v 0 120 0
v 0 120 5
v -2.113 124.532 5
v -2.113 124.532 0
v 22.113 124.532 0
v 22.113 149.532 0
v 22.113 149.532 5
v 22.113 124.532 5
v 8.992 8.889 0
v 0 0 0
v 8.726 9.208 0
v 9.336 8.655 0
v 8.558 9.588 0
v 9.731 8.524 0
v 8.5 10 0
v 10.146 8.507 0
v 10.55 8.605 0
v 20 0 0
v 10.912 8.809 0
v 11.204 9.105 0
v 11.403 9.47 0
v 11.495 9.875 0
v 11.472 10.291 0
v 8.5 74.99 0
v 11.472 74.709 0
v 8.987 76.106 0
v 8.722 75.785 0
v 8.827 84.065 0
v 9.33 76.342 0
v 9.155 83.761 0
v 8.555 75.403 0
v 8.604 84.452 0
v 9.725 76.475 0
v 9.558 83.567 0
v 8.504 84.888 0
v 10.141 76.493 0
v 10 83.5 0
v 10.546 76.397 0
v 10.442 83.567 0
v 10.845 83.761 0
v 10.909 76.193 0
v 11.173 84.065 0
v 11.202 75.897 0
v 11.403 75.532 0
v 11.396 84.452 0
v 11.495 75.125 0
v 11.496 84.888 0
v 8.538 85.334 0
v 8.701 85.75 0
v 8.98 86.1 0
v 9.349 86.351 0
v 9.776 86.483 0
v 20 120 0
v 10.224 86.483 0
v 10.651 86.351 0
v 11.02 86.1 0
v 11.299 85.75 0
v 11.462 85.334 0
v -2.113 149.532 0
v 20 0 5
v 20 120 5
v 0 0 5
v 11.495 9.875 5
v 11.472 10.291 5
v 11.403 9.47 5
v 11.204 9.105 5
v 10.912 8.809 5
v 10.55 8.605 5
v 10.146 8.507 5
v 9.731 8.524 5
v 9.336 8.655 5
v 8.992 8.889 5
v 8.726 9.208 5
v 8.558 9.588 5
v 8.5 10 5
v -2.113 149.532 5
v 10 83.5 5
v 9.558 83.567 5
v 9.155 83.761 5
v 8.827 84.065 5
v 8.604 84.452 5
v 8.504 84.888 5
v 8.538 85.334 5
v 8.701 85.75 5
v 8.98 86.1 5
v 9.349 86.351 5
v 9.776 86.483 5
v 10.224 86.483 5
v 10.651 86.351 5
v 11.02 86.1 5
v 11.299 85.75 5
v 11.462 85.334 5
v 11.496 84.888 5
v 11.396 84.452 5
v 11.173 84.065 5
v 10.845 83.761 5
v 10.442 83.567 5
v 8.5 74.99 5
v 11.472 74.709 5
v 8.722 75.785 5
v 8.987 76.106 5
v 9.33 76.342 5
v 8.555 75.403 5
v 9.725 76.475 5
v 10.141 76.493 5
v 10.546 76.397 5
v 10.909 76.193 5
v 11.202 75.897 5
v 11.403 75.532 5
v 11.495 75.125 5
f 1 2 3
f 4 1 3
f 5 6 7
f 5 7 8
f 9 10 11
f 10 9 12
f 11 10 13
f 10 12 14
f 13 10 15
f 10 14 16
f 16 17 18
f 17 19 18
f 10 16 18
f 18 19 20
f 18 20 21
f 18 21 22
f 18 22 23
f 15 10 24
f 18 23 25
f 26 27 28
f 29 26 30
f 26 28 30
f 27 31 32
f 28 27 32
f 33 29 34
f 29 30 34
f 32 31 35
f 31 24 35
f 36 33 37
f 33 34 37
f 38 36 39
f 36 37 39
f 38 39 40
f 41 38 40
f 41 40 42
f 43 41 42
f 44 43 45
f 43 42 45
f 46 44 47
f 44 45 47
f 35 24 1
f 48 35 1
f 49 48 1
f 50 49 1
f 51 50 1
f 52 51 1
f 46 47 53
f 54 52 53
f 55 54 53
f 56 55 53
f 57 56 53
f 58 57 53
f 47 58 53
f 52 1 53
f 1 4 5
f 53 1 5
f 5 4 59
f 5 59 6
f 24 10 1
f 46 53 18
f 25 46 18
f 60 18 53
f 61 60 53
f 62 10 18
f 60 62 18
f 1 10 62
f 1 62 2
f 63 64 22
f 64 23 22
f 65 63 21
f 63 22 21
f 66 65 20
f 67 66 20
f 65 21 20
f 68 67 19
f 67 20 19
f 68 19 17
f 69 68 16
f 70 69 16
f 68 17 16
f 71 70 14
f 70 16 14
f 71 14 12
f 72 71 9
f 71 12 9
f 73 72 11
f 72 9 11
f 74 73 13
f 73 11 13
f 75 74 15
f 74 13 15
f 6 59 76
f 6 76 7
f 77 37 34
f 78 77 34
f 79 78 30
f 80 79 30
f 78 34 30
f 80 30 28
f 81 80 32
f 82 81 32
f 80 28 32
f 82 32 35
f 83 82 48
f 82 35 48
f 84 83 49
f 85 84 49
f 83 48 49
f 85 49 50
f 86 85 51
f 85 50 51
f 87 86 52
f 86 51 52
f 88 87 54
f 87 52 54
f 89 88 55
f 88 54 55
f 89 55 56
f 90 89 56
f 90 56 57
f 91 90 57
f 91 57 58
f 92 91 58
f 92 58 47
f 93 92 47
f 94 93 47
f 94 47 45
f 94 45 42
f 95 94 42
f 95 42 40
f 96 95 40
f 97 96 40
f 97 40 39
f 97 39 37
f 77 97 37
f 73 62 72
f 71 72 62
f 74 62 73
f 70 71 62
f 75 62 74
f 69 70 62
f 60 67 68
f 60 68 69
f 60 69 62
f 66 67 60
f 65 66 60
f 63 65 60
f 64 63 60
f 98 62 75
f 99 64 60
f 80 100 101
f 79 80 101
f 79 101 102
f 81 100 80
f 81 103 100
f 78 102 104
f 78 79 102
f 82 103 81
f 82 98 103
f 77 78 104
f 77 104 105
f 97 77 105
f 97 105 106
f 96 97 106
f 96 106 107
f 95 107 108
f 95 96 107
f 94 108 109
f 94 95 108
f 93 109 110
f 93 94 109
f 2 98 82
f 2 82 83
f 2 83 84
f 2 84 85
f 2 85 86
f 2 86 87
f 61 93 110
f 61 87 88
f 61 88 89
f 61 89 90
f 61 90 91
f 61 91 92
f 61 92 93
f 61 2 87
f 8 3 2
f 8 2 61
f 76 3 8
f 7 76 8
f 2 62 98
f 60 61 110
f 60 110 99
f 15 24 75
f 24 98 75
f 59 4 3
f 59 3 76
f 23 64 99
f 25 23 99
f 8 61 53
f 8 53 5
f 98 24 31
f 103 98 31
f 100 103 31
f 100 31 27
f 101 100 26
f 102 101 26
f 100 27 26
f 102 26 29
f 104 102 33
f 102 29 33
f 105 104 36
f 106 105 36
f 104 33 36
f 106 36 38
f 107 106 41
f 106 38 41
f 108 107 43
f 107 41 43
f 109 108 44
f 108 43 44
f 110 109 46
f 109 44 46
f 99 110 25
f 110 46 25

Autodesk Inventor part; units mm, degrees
ref_plane "YZ Plane" through (0, 0, 0) normal (1, 0, 0) x (0, 1, 0)
ref_plane "XZ Plane" through (0, 0, 0) normal (0, 1, 0) x (-1, 0, 0)
ref_plane "XY Plane" through (0, 0, 0) normal (0, 0, 1) x (1, 0, 0)
sketch "Sketch1" plane through (0, 0, 0) normal (0, 0, 1) x (1, 0, 0)
  line L0 (0, 0) -> (20, 0)
  line L1 (20, 0) -> (20, 120)
  line L2 (0, 0) -> (0, 120)
  line L3 (0, 0) -> (120, 0) construction
  line L4 (20, 120) -> (22.1131, 124.5315)
  line L5 (20, 120) -> (25, 120) construction
  line L6 (0, 120) -> (-2.1131, 124.5315)
  line L7 (-2.1131, 124.5315) -> (-2.1131, 149.5315)
  line L8 (-2.1131, 149.5315) -> (22.1131, 149.5315)
  line L9 (22.1131, 149.5315) -> (22.1131, 124.5315)
  dimension "d0" = 20
  dimension "d1" = 120
  dimension "d2" = 90
  dimension "d3" = 120
  dimension "d4" = 90
  dimension "d5" = 5
  dimension "d6" = 65
  dimension "d7" = 5
  dimension "d8" = 25
extrude "Extrusion1" add sketch "Sketch1" along normal blind 5
sketch "Sketch2" plane through (0, 0, 5) normal (0, 0, 1) x (1, 0, 0)
  point P0 (0, 0)
  point P1 (10, 10)
hole "Hole1" at (10, 10, 5) direction (0, 0, -1) diameter 3 end through all
sketch "Sketch3" plane through (0, 0, 5) normal (0, 0, 1) x (1, 0, 0)
  point P0 (0, 0)
sketch "Sketch4" plane through (0, 0, 5) normal (0, 0, 1) x (1, 0, 0)
  point P0 (0, 0)
  point P1 (10, 75)
hole "Hole2" at (10, 75, 5) direction (0, 0, -1) diameter 3 end through all
sketch "Sketch5" plane through (0, 0, 5) normal (0, 0, 1) x (1, 0, 0)
  circle A0 centre (10, 10) radius 1.5 projected
  line L0 (11.4716, 74.9905) -> (8.5, 74.9905)
  line L1 (8.5, 74.9905) -> (8.5, 10)
  line L2 (8.5, 10) -> (11.4716, 10)
  line L3 (11.4716, 10) -> (11.4716, 74.9905)
  point P0 (0, 0)
extrude "Extrusion2" cut sketch "Sketch5" against normal blind 10 contours L1 L0 L3 A0 | A0 L3 L2 picked at (9.5055, 10.1215)
sketch "Sketch6" plane through (0, 0, 5) normal (0, 0, 1) x (1, 0, 0)
  point P0 (0, 0)
  point P1 (10, 85)
hole "Hole3" at (10, 85, 5) direction (0, 0, -1) diameter 3 end through all
sketch "Sketch8" plane through (0, 0, 0) normal (0, 0, -1) x (-1, 0, 0)
  point P0 (0, 0)
  point P1 (-10, -8)
hole "Hole4" at (10, -8, 0) direction (0, 0, 1) diameter 3 end through all
sketch "Sketch10" plane through (0, 0, 5) normal (0, 0, 1) x (1, 0, 0)
  line L0 (22.1131, 124.5315) -> (22.1131, 149.5315) projected
  line L1 (-2.1131, 149.5315) -> (-2.1131, 124.5315) projected
  point P0 (0, 0)
  dimension "d45" = 24.2262
sketch "Sketch11" plane through (0, 0, 5) normal (0, 0, 1) x (1, 0, 0)
  point P0 (0, 0)
sketch "Sketch12" plane through (0, 0, 5) normal (0, 0, 1) x (1, 0, 0)
  point P0 (0, 0)
sketch "Sketch13" plane through (0, 0, 5) normal (0, 0, 1) x (1, 0, 0)
  point P0 (0, 0)
properties material "Steel, Cast"
